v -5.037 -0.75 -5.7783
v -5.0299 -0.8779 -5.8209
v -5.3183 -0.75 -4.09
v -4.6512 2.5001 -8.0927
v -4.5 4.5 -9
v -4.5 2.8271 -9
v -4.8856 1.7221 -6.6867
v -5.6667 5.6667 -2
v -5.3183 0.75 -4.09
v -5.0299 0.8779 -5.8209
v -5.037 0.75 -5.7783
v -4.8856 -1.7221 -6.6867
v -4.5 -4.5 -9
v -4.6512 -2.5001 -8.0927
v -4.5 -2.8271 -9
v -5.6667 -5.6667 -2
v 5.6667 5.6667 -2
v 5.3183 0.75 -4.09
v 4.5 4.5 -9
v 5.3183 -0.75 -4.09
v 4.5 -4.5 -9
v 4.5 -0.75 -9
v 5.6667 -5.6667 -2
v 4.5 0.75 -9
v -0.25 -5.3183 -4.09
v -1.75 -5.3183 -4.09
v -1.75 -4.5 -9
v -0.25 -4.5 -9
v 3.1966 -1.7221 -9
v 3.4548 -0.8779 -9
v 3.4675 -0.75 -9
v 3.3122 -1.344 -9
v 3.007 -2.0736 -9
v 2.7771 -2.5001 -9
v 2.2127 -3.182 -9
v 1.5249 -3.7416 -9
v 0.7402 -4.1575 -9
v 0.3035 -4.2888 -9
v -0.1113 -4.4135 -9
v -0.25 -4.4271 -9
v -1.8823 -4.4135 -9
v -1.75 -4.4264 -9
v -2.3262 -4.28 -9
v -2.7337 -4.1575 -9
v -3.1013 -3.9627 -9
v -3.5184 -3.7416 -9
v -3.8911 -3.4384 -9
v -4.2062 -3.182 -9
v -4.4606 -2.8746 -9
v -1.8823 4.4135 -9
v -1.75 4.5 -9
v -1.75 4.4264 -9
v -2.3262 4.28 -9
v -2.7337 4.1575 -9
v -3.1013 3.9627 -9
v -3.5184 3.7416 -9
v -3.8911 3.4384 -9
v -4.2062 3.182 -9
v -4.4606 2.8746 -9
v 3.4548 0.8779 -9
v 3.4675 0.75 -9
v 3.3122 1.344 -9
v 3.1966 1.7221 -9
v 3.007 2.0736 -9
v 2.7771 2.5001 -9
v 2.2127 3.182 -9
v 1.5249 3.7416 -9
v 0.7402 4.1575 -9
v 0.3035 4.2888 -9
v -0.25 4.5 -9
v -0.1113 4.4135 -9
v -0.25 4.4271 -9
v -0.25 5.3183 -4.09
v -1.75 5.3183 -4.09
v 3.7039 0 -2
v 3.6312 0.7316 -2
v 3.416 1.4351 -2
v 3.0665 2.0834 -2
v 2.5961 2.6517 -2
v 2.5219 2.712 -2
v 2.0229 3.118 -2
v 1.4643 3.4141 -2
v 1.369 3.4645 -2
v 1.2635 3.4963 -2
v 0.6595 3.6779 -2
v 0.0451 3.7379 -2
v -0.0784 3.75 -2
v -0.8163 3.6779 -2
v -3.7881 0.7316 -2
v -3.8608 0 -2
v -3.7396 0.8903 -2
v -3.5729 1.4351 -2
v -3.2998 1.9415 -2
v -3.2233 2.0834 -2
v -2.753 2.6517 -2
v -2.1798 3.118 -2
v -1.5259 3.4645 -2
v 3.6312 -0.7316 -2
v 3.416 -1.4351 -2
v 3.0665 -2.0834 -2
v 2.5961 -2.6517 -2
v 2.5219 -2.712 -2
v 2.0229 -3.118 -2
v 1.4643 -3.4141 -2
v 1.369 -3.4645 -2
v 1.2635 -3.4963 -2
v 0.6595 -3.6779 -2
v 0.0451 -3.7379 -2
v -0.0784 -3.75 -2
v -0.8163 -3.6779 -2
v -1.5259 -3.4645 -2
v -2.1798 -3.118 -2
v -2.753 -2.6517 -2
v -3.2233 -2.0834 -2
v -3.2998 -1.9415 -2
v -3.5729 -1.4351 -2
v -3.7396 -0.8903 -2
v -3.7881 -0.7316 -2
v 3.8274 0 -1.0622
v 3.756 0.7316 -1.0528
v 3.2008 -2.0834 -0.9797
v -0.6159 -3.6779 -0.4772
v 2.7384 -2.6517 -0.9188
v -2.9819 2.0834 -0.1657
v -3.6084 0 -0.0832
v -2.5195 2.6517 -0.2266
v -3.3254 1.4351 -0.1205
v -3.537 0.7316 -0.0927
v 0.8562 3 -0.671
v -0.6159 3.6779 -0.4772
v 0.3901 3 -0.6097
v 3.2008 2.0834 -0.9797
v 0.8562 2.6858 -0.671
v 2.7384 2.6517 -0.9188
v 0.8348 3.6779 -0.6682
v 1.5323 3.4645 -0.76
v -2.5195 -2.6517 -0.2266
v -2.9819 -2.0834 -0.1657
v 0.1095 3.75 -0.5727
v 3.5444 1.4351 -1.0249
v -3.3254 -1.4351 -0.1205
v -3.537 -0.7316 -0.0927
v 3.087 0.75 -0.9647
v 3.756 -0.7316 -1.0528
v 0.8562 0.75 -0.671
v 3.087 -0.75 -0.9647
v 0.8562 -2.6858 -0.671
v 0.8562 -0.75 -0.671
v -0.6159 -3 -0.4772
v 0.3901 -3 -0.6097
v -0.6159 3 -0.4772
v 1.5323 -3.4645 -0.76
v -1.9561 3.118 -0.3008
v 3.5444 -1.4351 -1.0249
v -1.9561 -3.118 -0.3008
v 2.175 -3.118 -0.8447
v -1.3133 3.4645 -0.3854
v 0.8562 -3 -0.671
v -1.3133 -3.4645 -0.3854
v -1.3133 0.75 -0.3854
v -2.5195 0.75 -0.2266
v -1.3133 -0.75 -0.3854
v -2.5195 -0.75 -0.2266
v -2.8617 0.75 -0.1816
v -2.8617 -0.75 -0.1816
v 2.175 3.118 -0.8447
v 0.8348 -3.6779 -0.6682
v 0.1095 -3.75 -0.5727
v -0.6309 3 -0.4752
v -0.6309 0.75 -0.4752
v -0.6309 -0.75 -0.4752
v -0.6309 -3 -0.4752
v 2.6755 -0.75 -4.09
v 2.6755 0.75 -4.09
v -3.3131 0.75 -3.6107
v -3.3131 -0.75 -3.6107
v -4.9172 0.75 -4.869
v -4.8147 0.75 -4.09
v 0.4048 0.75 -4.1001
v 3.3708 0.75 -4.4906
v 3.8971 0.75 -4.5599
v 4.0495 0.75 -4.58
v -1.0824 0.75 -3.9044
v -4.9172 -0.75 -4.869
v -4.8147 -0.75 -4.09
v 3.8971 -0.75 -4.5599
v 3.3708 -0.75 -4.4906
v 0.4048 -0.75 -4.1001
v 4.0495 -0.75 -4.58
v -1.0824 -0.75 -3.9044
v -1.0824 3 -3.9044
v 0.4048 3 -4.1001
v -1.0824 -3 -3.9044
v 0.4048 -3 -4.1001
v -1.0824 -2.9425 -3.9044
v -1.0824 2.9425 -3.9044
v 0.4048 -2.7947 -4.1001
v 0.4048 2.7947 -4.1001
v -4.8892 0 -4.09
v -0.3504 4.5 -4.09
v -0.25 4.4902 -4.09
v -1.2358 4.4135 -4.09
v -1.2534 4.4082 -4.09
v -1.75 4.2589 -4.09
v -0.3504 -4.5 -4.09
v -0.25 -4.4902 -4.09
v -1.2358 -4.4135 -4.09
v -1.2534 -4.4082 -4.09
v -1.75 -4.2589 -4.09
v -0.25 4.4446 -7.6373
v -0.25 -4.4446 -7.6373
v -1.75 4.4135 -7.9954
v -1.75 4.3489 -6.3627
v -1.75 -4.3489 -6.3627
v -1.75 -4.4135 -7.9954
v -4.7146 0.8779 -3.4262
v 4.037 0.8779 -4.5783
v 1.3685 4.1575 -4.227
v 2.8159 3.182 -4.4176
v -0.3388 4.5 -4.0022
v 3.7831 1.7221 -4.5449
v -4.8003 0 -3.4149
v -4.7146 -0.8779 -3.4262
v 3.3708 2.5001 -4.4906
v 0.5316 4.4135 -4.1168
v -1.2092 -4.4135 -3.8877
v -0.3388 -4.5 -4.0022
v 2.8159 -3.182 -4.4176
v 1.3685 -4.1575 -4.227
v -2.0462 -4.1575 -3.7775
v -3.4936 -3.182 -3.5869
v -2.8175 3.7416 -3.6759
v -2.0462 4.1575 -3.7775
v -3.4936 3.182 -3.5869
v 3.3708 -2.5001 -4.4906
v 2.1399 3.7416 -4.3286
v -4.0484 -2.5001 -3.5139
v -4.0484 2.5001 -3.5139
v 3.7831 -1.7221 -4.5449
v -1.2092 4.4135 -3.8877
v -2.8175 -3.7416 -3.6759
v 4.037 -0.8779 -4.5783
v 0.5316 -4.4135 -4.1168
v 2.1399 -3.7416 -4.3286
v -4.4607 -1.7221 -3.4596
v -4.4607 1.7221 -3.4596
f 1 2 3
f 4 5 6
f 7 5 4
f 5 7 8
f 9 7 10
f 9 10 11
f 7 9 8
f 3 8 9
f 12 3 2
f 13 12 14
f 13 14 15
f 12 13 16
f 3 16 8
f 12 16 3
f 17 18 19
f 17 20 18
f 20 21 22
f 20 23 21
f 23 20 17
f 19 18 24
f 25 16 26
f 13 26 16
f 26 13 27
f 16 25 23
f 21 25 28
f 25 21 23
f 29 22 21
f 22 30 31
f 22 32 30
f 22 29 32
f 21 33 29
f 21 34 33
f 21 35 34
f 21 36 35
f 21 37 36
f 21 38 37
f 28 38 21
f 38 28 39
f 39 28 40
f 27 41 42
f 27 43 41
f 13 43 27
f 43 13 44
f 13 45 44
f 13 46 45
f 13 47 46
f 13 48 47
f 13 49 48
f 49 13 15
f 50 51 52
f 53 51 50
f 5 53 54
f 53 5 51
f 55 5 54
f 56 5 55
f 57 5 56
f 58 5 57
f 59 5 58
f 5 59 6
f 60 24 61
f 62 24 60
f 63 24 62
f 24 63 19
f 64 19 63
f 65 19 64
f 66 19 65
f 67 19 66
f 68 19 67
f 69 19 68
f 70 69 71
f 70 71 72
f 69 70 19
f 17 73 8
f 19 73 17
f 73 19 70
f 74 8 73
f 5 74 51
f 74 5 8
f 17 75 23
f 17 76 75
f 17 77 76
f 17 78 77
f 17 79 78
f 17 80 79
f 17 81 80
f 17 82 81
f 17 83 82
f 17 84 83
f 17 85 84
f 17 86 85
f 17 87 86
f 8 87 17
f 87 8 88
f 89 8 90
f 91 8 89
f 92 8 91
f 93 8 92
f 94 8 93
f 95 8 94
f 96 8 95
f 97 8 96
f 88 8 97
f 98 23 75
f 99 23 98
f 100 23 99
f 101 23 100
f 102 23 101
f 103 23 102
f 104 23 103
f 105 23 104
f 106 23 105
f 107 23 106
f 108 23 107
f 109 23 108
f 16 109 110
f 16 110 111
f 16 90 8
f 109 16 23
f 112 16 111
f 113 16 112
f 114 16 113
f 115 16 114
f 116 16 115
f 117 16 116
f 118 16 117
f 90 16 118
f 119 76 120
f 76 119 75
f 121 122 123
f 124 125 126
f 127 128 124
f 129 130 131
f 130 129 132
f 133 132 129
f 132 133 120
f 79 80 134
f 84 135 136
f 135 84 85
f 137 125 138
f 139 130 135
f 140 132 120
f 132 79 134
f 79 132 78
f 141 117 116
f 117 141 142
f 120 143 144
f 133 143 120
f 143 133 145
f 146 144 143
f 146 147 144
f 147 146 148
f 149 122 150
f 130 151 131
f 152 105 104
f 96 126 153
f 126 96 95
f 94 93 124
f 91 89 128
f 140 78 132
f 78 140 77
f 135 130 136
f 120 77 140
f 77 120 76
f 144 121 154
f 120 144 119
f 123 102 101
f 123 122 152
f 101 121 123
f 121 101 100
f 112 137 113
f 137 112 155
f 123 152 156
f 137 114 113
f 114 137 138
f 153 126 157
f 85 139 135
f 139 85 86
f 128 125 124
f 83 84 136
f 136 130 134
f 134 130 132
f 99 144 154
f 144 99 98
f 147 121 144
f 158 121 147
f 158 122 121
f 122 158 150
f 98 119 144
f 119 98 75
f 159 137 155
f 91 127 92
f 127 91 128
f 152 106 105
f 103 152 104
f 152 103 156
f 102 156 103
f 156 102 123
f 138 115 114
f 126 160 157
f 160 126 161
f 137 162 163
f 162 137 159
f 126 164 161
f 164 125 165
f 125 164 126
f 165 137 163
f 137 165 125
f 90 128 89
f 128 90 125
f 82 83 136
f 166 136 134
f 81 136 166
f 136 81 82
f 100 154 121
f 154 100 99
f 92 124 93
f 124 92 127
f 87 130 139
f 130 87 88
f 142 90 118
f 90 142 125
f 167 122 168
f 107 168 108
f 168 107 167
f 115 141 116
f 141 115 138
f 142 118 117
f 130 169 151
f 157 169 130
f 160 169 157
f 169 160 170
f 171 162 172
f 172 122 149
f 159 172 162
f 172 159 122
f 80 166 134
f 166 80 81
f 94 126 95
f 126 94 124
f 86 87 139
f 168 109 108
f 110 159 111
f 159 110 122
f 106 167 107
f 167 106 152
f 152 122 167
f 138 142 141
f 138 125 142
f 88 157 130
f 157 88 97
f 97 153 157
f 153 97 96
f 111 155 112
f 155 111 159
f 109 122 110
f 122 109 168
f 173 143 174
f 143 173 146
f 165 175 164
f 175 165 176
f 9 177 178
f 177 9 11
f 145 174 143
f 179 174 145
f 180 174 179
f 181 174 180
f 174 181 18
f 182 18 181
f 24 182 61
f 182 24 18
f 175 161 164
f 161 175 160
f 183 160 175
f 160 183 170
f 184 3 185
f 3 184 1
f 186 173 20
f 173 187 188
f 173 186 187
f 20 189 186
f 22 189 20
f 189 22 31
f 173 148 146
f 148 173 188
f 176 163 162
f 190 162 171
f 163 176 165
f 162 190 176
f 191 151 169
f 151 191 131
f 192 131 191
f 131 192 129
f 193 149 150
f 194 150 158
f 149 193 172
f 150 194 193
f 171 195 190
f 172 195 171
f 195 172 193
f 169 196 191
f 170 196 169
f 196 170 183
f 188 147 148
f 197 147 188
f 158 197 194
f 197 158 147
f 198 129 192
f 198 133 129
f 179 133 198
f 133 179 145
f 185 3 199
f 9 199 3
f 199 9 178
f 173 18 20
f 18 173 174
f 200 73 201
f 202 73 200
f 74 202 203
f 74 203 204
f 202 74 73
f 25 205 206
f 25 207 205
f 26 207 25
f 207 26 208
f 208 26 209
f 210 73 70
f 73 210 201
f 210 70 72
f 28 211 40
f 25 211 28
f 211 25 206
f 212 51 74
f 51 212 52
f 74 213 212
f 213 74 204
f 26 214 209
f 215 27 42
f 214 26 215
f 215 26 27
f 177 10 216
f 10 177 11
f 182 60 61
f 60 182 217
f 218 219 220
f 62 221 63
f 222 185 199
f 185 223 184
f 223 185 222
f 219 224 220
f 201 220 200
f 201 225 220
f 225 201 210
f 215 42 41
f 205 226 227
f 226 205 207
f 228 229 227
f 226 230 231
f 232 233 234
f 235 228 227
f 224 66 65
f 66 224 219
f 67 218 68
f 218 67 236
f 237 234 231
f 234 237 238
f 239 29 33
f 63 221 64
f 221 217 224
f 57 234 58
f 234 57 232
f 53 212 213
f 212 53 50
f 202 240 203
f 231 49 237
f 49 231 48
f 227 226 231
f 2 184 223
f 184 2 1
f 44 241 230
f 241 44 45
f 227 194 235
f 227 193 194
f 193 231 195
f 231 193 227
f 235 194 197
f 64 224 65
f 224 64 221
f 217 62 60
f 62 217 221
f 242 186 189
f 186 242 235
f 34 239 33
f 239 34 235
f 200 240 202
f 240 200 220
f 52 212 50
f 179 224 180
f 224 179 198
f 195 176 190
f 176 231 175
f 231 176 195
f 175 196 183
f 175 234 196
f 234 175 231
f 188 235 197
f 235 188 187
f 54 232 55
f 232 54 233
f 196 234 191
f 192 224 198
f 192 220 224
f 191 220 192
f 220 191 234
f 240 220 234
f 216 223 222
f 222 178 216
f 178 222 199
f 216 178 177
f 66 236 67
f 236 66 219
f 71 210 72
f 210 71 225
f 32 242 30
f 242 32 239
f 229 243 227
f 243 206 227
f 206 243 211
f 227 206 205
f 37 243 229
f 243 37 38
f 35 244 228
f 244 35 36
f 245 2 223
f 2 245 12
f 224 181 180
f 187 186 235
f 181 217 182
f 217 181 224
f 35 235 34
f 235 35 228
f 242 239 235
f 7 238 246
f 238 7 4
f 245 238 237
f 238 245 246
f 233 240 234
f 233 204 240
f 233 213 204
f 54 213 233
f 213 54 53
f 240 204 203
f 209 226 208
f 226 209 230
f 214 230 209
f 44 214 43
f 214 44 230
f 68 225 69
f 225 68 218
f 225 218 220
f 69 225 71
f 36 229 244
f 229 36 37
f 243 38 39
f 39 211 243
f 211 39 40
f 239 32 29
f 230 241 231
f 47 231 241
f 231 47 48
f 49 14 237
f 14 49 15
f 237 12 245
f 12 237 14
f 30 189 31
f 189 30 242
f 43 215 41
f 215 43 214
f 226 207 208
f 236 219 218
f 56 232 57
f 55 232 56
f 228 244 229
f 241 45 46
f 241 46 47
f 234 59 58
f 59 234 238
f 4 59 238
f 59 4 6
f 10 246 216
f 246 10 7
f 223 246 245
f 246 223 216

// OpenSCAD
$fn=32;

key_rim_diameter=12;
key_well_diameter=9;
key_well_depth=9;
key_well_scale=(key_well_diameter/key_rim_diameter);
key_wall_thick=1.5;
key_wall_height=key_well_depth-4;
key_well_origin=-1;
key_mount_diameter=7.5;
key_mount_height=key_well_depth-0.5;
key_mount_angle=7.5;
key_mount_cross_diameter=6;
key_mount_cross_thick=1.5;
key_mount_cross_depth=key_mount_height;

cut_well_top_offset=2;

    //rotate([-25+90,0,0])
difference()
{

difference()
{
union()
{
    
translate([key_well_origin,0,-key_well_depth]) 
rotate([0,key_mount_angle,0])
{
    cylinder(d=key_mount_diameter,h=key_mount_height);
    

}

    difference() {    
        translate([0,0,0 -1* key_well_depth/2])
        rotate([180,0,0])
        linear_extrude (height = key_well_depth, center = true, convexity = 10, scale=key_well_scale)
            square (key_rim_diameter,true);

        cube ([key_rim_diameter*2,key_rim_diameter*2,cut_well_top_offset*2],center = true);
    }
}

translate([0,0,-1.01*key_well_depth])
{
    translate([-1*key_rim_diameter,-key_wall_thick/2,0])
    cube([key_rim_diameter*2,key_wall_thick,key_wall_height]);

    translate([key_well_origin-key_wall_thick/2,-1*key_rim_diameter,0])
    cube([key_wall_thick,key_rim_diameter*2,key_wall_height]);
       
    
    rotate([0,key_mount_angle,0])
    translate([key_well_origin,0,-key_wall_height])
    cylinder(d=key_mount_diameter*1.2,h=key_wall_height*2);
    
    rotate([0,key_mount_angle,0])
    translate([key_well_origin,0,-key_mount_cross_depth+0.01])
    {
    translate([-key_mount_cross_diameter/2,-key_mount_cross_thick/2,key_mount_height])
    cube([key_mount_cross_diameter,key_mount_cross_thick,key_mount_cross_depth*2]);
    
    rotate([0,0,90])
    translate([-key_mount_cross_diameter/2,-key_mount_cross_thick/2,key_mount_height])
    cube([key_mount_cross_diameter,key_mount_cross_thick,key_mount_cross_depth*2]);
    }
}

}
    //rotate([25,0,0])
    //rotate([180,0,0])
    //translate([0,key_rim_diameter/2,0])
    //cube ([key_rim_diameter*2,key_rim_diameter,key_well_depth*3],center=true);
}
